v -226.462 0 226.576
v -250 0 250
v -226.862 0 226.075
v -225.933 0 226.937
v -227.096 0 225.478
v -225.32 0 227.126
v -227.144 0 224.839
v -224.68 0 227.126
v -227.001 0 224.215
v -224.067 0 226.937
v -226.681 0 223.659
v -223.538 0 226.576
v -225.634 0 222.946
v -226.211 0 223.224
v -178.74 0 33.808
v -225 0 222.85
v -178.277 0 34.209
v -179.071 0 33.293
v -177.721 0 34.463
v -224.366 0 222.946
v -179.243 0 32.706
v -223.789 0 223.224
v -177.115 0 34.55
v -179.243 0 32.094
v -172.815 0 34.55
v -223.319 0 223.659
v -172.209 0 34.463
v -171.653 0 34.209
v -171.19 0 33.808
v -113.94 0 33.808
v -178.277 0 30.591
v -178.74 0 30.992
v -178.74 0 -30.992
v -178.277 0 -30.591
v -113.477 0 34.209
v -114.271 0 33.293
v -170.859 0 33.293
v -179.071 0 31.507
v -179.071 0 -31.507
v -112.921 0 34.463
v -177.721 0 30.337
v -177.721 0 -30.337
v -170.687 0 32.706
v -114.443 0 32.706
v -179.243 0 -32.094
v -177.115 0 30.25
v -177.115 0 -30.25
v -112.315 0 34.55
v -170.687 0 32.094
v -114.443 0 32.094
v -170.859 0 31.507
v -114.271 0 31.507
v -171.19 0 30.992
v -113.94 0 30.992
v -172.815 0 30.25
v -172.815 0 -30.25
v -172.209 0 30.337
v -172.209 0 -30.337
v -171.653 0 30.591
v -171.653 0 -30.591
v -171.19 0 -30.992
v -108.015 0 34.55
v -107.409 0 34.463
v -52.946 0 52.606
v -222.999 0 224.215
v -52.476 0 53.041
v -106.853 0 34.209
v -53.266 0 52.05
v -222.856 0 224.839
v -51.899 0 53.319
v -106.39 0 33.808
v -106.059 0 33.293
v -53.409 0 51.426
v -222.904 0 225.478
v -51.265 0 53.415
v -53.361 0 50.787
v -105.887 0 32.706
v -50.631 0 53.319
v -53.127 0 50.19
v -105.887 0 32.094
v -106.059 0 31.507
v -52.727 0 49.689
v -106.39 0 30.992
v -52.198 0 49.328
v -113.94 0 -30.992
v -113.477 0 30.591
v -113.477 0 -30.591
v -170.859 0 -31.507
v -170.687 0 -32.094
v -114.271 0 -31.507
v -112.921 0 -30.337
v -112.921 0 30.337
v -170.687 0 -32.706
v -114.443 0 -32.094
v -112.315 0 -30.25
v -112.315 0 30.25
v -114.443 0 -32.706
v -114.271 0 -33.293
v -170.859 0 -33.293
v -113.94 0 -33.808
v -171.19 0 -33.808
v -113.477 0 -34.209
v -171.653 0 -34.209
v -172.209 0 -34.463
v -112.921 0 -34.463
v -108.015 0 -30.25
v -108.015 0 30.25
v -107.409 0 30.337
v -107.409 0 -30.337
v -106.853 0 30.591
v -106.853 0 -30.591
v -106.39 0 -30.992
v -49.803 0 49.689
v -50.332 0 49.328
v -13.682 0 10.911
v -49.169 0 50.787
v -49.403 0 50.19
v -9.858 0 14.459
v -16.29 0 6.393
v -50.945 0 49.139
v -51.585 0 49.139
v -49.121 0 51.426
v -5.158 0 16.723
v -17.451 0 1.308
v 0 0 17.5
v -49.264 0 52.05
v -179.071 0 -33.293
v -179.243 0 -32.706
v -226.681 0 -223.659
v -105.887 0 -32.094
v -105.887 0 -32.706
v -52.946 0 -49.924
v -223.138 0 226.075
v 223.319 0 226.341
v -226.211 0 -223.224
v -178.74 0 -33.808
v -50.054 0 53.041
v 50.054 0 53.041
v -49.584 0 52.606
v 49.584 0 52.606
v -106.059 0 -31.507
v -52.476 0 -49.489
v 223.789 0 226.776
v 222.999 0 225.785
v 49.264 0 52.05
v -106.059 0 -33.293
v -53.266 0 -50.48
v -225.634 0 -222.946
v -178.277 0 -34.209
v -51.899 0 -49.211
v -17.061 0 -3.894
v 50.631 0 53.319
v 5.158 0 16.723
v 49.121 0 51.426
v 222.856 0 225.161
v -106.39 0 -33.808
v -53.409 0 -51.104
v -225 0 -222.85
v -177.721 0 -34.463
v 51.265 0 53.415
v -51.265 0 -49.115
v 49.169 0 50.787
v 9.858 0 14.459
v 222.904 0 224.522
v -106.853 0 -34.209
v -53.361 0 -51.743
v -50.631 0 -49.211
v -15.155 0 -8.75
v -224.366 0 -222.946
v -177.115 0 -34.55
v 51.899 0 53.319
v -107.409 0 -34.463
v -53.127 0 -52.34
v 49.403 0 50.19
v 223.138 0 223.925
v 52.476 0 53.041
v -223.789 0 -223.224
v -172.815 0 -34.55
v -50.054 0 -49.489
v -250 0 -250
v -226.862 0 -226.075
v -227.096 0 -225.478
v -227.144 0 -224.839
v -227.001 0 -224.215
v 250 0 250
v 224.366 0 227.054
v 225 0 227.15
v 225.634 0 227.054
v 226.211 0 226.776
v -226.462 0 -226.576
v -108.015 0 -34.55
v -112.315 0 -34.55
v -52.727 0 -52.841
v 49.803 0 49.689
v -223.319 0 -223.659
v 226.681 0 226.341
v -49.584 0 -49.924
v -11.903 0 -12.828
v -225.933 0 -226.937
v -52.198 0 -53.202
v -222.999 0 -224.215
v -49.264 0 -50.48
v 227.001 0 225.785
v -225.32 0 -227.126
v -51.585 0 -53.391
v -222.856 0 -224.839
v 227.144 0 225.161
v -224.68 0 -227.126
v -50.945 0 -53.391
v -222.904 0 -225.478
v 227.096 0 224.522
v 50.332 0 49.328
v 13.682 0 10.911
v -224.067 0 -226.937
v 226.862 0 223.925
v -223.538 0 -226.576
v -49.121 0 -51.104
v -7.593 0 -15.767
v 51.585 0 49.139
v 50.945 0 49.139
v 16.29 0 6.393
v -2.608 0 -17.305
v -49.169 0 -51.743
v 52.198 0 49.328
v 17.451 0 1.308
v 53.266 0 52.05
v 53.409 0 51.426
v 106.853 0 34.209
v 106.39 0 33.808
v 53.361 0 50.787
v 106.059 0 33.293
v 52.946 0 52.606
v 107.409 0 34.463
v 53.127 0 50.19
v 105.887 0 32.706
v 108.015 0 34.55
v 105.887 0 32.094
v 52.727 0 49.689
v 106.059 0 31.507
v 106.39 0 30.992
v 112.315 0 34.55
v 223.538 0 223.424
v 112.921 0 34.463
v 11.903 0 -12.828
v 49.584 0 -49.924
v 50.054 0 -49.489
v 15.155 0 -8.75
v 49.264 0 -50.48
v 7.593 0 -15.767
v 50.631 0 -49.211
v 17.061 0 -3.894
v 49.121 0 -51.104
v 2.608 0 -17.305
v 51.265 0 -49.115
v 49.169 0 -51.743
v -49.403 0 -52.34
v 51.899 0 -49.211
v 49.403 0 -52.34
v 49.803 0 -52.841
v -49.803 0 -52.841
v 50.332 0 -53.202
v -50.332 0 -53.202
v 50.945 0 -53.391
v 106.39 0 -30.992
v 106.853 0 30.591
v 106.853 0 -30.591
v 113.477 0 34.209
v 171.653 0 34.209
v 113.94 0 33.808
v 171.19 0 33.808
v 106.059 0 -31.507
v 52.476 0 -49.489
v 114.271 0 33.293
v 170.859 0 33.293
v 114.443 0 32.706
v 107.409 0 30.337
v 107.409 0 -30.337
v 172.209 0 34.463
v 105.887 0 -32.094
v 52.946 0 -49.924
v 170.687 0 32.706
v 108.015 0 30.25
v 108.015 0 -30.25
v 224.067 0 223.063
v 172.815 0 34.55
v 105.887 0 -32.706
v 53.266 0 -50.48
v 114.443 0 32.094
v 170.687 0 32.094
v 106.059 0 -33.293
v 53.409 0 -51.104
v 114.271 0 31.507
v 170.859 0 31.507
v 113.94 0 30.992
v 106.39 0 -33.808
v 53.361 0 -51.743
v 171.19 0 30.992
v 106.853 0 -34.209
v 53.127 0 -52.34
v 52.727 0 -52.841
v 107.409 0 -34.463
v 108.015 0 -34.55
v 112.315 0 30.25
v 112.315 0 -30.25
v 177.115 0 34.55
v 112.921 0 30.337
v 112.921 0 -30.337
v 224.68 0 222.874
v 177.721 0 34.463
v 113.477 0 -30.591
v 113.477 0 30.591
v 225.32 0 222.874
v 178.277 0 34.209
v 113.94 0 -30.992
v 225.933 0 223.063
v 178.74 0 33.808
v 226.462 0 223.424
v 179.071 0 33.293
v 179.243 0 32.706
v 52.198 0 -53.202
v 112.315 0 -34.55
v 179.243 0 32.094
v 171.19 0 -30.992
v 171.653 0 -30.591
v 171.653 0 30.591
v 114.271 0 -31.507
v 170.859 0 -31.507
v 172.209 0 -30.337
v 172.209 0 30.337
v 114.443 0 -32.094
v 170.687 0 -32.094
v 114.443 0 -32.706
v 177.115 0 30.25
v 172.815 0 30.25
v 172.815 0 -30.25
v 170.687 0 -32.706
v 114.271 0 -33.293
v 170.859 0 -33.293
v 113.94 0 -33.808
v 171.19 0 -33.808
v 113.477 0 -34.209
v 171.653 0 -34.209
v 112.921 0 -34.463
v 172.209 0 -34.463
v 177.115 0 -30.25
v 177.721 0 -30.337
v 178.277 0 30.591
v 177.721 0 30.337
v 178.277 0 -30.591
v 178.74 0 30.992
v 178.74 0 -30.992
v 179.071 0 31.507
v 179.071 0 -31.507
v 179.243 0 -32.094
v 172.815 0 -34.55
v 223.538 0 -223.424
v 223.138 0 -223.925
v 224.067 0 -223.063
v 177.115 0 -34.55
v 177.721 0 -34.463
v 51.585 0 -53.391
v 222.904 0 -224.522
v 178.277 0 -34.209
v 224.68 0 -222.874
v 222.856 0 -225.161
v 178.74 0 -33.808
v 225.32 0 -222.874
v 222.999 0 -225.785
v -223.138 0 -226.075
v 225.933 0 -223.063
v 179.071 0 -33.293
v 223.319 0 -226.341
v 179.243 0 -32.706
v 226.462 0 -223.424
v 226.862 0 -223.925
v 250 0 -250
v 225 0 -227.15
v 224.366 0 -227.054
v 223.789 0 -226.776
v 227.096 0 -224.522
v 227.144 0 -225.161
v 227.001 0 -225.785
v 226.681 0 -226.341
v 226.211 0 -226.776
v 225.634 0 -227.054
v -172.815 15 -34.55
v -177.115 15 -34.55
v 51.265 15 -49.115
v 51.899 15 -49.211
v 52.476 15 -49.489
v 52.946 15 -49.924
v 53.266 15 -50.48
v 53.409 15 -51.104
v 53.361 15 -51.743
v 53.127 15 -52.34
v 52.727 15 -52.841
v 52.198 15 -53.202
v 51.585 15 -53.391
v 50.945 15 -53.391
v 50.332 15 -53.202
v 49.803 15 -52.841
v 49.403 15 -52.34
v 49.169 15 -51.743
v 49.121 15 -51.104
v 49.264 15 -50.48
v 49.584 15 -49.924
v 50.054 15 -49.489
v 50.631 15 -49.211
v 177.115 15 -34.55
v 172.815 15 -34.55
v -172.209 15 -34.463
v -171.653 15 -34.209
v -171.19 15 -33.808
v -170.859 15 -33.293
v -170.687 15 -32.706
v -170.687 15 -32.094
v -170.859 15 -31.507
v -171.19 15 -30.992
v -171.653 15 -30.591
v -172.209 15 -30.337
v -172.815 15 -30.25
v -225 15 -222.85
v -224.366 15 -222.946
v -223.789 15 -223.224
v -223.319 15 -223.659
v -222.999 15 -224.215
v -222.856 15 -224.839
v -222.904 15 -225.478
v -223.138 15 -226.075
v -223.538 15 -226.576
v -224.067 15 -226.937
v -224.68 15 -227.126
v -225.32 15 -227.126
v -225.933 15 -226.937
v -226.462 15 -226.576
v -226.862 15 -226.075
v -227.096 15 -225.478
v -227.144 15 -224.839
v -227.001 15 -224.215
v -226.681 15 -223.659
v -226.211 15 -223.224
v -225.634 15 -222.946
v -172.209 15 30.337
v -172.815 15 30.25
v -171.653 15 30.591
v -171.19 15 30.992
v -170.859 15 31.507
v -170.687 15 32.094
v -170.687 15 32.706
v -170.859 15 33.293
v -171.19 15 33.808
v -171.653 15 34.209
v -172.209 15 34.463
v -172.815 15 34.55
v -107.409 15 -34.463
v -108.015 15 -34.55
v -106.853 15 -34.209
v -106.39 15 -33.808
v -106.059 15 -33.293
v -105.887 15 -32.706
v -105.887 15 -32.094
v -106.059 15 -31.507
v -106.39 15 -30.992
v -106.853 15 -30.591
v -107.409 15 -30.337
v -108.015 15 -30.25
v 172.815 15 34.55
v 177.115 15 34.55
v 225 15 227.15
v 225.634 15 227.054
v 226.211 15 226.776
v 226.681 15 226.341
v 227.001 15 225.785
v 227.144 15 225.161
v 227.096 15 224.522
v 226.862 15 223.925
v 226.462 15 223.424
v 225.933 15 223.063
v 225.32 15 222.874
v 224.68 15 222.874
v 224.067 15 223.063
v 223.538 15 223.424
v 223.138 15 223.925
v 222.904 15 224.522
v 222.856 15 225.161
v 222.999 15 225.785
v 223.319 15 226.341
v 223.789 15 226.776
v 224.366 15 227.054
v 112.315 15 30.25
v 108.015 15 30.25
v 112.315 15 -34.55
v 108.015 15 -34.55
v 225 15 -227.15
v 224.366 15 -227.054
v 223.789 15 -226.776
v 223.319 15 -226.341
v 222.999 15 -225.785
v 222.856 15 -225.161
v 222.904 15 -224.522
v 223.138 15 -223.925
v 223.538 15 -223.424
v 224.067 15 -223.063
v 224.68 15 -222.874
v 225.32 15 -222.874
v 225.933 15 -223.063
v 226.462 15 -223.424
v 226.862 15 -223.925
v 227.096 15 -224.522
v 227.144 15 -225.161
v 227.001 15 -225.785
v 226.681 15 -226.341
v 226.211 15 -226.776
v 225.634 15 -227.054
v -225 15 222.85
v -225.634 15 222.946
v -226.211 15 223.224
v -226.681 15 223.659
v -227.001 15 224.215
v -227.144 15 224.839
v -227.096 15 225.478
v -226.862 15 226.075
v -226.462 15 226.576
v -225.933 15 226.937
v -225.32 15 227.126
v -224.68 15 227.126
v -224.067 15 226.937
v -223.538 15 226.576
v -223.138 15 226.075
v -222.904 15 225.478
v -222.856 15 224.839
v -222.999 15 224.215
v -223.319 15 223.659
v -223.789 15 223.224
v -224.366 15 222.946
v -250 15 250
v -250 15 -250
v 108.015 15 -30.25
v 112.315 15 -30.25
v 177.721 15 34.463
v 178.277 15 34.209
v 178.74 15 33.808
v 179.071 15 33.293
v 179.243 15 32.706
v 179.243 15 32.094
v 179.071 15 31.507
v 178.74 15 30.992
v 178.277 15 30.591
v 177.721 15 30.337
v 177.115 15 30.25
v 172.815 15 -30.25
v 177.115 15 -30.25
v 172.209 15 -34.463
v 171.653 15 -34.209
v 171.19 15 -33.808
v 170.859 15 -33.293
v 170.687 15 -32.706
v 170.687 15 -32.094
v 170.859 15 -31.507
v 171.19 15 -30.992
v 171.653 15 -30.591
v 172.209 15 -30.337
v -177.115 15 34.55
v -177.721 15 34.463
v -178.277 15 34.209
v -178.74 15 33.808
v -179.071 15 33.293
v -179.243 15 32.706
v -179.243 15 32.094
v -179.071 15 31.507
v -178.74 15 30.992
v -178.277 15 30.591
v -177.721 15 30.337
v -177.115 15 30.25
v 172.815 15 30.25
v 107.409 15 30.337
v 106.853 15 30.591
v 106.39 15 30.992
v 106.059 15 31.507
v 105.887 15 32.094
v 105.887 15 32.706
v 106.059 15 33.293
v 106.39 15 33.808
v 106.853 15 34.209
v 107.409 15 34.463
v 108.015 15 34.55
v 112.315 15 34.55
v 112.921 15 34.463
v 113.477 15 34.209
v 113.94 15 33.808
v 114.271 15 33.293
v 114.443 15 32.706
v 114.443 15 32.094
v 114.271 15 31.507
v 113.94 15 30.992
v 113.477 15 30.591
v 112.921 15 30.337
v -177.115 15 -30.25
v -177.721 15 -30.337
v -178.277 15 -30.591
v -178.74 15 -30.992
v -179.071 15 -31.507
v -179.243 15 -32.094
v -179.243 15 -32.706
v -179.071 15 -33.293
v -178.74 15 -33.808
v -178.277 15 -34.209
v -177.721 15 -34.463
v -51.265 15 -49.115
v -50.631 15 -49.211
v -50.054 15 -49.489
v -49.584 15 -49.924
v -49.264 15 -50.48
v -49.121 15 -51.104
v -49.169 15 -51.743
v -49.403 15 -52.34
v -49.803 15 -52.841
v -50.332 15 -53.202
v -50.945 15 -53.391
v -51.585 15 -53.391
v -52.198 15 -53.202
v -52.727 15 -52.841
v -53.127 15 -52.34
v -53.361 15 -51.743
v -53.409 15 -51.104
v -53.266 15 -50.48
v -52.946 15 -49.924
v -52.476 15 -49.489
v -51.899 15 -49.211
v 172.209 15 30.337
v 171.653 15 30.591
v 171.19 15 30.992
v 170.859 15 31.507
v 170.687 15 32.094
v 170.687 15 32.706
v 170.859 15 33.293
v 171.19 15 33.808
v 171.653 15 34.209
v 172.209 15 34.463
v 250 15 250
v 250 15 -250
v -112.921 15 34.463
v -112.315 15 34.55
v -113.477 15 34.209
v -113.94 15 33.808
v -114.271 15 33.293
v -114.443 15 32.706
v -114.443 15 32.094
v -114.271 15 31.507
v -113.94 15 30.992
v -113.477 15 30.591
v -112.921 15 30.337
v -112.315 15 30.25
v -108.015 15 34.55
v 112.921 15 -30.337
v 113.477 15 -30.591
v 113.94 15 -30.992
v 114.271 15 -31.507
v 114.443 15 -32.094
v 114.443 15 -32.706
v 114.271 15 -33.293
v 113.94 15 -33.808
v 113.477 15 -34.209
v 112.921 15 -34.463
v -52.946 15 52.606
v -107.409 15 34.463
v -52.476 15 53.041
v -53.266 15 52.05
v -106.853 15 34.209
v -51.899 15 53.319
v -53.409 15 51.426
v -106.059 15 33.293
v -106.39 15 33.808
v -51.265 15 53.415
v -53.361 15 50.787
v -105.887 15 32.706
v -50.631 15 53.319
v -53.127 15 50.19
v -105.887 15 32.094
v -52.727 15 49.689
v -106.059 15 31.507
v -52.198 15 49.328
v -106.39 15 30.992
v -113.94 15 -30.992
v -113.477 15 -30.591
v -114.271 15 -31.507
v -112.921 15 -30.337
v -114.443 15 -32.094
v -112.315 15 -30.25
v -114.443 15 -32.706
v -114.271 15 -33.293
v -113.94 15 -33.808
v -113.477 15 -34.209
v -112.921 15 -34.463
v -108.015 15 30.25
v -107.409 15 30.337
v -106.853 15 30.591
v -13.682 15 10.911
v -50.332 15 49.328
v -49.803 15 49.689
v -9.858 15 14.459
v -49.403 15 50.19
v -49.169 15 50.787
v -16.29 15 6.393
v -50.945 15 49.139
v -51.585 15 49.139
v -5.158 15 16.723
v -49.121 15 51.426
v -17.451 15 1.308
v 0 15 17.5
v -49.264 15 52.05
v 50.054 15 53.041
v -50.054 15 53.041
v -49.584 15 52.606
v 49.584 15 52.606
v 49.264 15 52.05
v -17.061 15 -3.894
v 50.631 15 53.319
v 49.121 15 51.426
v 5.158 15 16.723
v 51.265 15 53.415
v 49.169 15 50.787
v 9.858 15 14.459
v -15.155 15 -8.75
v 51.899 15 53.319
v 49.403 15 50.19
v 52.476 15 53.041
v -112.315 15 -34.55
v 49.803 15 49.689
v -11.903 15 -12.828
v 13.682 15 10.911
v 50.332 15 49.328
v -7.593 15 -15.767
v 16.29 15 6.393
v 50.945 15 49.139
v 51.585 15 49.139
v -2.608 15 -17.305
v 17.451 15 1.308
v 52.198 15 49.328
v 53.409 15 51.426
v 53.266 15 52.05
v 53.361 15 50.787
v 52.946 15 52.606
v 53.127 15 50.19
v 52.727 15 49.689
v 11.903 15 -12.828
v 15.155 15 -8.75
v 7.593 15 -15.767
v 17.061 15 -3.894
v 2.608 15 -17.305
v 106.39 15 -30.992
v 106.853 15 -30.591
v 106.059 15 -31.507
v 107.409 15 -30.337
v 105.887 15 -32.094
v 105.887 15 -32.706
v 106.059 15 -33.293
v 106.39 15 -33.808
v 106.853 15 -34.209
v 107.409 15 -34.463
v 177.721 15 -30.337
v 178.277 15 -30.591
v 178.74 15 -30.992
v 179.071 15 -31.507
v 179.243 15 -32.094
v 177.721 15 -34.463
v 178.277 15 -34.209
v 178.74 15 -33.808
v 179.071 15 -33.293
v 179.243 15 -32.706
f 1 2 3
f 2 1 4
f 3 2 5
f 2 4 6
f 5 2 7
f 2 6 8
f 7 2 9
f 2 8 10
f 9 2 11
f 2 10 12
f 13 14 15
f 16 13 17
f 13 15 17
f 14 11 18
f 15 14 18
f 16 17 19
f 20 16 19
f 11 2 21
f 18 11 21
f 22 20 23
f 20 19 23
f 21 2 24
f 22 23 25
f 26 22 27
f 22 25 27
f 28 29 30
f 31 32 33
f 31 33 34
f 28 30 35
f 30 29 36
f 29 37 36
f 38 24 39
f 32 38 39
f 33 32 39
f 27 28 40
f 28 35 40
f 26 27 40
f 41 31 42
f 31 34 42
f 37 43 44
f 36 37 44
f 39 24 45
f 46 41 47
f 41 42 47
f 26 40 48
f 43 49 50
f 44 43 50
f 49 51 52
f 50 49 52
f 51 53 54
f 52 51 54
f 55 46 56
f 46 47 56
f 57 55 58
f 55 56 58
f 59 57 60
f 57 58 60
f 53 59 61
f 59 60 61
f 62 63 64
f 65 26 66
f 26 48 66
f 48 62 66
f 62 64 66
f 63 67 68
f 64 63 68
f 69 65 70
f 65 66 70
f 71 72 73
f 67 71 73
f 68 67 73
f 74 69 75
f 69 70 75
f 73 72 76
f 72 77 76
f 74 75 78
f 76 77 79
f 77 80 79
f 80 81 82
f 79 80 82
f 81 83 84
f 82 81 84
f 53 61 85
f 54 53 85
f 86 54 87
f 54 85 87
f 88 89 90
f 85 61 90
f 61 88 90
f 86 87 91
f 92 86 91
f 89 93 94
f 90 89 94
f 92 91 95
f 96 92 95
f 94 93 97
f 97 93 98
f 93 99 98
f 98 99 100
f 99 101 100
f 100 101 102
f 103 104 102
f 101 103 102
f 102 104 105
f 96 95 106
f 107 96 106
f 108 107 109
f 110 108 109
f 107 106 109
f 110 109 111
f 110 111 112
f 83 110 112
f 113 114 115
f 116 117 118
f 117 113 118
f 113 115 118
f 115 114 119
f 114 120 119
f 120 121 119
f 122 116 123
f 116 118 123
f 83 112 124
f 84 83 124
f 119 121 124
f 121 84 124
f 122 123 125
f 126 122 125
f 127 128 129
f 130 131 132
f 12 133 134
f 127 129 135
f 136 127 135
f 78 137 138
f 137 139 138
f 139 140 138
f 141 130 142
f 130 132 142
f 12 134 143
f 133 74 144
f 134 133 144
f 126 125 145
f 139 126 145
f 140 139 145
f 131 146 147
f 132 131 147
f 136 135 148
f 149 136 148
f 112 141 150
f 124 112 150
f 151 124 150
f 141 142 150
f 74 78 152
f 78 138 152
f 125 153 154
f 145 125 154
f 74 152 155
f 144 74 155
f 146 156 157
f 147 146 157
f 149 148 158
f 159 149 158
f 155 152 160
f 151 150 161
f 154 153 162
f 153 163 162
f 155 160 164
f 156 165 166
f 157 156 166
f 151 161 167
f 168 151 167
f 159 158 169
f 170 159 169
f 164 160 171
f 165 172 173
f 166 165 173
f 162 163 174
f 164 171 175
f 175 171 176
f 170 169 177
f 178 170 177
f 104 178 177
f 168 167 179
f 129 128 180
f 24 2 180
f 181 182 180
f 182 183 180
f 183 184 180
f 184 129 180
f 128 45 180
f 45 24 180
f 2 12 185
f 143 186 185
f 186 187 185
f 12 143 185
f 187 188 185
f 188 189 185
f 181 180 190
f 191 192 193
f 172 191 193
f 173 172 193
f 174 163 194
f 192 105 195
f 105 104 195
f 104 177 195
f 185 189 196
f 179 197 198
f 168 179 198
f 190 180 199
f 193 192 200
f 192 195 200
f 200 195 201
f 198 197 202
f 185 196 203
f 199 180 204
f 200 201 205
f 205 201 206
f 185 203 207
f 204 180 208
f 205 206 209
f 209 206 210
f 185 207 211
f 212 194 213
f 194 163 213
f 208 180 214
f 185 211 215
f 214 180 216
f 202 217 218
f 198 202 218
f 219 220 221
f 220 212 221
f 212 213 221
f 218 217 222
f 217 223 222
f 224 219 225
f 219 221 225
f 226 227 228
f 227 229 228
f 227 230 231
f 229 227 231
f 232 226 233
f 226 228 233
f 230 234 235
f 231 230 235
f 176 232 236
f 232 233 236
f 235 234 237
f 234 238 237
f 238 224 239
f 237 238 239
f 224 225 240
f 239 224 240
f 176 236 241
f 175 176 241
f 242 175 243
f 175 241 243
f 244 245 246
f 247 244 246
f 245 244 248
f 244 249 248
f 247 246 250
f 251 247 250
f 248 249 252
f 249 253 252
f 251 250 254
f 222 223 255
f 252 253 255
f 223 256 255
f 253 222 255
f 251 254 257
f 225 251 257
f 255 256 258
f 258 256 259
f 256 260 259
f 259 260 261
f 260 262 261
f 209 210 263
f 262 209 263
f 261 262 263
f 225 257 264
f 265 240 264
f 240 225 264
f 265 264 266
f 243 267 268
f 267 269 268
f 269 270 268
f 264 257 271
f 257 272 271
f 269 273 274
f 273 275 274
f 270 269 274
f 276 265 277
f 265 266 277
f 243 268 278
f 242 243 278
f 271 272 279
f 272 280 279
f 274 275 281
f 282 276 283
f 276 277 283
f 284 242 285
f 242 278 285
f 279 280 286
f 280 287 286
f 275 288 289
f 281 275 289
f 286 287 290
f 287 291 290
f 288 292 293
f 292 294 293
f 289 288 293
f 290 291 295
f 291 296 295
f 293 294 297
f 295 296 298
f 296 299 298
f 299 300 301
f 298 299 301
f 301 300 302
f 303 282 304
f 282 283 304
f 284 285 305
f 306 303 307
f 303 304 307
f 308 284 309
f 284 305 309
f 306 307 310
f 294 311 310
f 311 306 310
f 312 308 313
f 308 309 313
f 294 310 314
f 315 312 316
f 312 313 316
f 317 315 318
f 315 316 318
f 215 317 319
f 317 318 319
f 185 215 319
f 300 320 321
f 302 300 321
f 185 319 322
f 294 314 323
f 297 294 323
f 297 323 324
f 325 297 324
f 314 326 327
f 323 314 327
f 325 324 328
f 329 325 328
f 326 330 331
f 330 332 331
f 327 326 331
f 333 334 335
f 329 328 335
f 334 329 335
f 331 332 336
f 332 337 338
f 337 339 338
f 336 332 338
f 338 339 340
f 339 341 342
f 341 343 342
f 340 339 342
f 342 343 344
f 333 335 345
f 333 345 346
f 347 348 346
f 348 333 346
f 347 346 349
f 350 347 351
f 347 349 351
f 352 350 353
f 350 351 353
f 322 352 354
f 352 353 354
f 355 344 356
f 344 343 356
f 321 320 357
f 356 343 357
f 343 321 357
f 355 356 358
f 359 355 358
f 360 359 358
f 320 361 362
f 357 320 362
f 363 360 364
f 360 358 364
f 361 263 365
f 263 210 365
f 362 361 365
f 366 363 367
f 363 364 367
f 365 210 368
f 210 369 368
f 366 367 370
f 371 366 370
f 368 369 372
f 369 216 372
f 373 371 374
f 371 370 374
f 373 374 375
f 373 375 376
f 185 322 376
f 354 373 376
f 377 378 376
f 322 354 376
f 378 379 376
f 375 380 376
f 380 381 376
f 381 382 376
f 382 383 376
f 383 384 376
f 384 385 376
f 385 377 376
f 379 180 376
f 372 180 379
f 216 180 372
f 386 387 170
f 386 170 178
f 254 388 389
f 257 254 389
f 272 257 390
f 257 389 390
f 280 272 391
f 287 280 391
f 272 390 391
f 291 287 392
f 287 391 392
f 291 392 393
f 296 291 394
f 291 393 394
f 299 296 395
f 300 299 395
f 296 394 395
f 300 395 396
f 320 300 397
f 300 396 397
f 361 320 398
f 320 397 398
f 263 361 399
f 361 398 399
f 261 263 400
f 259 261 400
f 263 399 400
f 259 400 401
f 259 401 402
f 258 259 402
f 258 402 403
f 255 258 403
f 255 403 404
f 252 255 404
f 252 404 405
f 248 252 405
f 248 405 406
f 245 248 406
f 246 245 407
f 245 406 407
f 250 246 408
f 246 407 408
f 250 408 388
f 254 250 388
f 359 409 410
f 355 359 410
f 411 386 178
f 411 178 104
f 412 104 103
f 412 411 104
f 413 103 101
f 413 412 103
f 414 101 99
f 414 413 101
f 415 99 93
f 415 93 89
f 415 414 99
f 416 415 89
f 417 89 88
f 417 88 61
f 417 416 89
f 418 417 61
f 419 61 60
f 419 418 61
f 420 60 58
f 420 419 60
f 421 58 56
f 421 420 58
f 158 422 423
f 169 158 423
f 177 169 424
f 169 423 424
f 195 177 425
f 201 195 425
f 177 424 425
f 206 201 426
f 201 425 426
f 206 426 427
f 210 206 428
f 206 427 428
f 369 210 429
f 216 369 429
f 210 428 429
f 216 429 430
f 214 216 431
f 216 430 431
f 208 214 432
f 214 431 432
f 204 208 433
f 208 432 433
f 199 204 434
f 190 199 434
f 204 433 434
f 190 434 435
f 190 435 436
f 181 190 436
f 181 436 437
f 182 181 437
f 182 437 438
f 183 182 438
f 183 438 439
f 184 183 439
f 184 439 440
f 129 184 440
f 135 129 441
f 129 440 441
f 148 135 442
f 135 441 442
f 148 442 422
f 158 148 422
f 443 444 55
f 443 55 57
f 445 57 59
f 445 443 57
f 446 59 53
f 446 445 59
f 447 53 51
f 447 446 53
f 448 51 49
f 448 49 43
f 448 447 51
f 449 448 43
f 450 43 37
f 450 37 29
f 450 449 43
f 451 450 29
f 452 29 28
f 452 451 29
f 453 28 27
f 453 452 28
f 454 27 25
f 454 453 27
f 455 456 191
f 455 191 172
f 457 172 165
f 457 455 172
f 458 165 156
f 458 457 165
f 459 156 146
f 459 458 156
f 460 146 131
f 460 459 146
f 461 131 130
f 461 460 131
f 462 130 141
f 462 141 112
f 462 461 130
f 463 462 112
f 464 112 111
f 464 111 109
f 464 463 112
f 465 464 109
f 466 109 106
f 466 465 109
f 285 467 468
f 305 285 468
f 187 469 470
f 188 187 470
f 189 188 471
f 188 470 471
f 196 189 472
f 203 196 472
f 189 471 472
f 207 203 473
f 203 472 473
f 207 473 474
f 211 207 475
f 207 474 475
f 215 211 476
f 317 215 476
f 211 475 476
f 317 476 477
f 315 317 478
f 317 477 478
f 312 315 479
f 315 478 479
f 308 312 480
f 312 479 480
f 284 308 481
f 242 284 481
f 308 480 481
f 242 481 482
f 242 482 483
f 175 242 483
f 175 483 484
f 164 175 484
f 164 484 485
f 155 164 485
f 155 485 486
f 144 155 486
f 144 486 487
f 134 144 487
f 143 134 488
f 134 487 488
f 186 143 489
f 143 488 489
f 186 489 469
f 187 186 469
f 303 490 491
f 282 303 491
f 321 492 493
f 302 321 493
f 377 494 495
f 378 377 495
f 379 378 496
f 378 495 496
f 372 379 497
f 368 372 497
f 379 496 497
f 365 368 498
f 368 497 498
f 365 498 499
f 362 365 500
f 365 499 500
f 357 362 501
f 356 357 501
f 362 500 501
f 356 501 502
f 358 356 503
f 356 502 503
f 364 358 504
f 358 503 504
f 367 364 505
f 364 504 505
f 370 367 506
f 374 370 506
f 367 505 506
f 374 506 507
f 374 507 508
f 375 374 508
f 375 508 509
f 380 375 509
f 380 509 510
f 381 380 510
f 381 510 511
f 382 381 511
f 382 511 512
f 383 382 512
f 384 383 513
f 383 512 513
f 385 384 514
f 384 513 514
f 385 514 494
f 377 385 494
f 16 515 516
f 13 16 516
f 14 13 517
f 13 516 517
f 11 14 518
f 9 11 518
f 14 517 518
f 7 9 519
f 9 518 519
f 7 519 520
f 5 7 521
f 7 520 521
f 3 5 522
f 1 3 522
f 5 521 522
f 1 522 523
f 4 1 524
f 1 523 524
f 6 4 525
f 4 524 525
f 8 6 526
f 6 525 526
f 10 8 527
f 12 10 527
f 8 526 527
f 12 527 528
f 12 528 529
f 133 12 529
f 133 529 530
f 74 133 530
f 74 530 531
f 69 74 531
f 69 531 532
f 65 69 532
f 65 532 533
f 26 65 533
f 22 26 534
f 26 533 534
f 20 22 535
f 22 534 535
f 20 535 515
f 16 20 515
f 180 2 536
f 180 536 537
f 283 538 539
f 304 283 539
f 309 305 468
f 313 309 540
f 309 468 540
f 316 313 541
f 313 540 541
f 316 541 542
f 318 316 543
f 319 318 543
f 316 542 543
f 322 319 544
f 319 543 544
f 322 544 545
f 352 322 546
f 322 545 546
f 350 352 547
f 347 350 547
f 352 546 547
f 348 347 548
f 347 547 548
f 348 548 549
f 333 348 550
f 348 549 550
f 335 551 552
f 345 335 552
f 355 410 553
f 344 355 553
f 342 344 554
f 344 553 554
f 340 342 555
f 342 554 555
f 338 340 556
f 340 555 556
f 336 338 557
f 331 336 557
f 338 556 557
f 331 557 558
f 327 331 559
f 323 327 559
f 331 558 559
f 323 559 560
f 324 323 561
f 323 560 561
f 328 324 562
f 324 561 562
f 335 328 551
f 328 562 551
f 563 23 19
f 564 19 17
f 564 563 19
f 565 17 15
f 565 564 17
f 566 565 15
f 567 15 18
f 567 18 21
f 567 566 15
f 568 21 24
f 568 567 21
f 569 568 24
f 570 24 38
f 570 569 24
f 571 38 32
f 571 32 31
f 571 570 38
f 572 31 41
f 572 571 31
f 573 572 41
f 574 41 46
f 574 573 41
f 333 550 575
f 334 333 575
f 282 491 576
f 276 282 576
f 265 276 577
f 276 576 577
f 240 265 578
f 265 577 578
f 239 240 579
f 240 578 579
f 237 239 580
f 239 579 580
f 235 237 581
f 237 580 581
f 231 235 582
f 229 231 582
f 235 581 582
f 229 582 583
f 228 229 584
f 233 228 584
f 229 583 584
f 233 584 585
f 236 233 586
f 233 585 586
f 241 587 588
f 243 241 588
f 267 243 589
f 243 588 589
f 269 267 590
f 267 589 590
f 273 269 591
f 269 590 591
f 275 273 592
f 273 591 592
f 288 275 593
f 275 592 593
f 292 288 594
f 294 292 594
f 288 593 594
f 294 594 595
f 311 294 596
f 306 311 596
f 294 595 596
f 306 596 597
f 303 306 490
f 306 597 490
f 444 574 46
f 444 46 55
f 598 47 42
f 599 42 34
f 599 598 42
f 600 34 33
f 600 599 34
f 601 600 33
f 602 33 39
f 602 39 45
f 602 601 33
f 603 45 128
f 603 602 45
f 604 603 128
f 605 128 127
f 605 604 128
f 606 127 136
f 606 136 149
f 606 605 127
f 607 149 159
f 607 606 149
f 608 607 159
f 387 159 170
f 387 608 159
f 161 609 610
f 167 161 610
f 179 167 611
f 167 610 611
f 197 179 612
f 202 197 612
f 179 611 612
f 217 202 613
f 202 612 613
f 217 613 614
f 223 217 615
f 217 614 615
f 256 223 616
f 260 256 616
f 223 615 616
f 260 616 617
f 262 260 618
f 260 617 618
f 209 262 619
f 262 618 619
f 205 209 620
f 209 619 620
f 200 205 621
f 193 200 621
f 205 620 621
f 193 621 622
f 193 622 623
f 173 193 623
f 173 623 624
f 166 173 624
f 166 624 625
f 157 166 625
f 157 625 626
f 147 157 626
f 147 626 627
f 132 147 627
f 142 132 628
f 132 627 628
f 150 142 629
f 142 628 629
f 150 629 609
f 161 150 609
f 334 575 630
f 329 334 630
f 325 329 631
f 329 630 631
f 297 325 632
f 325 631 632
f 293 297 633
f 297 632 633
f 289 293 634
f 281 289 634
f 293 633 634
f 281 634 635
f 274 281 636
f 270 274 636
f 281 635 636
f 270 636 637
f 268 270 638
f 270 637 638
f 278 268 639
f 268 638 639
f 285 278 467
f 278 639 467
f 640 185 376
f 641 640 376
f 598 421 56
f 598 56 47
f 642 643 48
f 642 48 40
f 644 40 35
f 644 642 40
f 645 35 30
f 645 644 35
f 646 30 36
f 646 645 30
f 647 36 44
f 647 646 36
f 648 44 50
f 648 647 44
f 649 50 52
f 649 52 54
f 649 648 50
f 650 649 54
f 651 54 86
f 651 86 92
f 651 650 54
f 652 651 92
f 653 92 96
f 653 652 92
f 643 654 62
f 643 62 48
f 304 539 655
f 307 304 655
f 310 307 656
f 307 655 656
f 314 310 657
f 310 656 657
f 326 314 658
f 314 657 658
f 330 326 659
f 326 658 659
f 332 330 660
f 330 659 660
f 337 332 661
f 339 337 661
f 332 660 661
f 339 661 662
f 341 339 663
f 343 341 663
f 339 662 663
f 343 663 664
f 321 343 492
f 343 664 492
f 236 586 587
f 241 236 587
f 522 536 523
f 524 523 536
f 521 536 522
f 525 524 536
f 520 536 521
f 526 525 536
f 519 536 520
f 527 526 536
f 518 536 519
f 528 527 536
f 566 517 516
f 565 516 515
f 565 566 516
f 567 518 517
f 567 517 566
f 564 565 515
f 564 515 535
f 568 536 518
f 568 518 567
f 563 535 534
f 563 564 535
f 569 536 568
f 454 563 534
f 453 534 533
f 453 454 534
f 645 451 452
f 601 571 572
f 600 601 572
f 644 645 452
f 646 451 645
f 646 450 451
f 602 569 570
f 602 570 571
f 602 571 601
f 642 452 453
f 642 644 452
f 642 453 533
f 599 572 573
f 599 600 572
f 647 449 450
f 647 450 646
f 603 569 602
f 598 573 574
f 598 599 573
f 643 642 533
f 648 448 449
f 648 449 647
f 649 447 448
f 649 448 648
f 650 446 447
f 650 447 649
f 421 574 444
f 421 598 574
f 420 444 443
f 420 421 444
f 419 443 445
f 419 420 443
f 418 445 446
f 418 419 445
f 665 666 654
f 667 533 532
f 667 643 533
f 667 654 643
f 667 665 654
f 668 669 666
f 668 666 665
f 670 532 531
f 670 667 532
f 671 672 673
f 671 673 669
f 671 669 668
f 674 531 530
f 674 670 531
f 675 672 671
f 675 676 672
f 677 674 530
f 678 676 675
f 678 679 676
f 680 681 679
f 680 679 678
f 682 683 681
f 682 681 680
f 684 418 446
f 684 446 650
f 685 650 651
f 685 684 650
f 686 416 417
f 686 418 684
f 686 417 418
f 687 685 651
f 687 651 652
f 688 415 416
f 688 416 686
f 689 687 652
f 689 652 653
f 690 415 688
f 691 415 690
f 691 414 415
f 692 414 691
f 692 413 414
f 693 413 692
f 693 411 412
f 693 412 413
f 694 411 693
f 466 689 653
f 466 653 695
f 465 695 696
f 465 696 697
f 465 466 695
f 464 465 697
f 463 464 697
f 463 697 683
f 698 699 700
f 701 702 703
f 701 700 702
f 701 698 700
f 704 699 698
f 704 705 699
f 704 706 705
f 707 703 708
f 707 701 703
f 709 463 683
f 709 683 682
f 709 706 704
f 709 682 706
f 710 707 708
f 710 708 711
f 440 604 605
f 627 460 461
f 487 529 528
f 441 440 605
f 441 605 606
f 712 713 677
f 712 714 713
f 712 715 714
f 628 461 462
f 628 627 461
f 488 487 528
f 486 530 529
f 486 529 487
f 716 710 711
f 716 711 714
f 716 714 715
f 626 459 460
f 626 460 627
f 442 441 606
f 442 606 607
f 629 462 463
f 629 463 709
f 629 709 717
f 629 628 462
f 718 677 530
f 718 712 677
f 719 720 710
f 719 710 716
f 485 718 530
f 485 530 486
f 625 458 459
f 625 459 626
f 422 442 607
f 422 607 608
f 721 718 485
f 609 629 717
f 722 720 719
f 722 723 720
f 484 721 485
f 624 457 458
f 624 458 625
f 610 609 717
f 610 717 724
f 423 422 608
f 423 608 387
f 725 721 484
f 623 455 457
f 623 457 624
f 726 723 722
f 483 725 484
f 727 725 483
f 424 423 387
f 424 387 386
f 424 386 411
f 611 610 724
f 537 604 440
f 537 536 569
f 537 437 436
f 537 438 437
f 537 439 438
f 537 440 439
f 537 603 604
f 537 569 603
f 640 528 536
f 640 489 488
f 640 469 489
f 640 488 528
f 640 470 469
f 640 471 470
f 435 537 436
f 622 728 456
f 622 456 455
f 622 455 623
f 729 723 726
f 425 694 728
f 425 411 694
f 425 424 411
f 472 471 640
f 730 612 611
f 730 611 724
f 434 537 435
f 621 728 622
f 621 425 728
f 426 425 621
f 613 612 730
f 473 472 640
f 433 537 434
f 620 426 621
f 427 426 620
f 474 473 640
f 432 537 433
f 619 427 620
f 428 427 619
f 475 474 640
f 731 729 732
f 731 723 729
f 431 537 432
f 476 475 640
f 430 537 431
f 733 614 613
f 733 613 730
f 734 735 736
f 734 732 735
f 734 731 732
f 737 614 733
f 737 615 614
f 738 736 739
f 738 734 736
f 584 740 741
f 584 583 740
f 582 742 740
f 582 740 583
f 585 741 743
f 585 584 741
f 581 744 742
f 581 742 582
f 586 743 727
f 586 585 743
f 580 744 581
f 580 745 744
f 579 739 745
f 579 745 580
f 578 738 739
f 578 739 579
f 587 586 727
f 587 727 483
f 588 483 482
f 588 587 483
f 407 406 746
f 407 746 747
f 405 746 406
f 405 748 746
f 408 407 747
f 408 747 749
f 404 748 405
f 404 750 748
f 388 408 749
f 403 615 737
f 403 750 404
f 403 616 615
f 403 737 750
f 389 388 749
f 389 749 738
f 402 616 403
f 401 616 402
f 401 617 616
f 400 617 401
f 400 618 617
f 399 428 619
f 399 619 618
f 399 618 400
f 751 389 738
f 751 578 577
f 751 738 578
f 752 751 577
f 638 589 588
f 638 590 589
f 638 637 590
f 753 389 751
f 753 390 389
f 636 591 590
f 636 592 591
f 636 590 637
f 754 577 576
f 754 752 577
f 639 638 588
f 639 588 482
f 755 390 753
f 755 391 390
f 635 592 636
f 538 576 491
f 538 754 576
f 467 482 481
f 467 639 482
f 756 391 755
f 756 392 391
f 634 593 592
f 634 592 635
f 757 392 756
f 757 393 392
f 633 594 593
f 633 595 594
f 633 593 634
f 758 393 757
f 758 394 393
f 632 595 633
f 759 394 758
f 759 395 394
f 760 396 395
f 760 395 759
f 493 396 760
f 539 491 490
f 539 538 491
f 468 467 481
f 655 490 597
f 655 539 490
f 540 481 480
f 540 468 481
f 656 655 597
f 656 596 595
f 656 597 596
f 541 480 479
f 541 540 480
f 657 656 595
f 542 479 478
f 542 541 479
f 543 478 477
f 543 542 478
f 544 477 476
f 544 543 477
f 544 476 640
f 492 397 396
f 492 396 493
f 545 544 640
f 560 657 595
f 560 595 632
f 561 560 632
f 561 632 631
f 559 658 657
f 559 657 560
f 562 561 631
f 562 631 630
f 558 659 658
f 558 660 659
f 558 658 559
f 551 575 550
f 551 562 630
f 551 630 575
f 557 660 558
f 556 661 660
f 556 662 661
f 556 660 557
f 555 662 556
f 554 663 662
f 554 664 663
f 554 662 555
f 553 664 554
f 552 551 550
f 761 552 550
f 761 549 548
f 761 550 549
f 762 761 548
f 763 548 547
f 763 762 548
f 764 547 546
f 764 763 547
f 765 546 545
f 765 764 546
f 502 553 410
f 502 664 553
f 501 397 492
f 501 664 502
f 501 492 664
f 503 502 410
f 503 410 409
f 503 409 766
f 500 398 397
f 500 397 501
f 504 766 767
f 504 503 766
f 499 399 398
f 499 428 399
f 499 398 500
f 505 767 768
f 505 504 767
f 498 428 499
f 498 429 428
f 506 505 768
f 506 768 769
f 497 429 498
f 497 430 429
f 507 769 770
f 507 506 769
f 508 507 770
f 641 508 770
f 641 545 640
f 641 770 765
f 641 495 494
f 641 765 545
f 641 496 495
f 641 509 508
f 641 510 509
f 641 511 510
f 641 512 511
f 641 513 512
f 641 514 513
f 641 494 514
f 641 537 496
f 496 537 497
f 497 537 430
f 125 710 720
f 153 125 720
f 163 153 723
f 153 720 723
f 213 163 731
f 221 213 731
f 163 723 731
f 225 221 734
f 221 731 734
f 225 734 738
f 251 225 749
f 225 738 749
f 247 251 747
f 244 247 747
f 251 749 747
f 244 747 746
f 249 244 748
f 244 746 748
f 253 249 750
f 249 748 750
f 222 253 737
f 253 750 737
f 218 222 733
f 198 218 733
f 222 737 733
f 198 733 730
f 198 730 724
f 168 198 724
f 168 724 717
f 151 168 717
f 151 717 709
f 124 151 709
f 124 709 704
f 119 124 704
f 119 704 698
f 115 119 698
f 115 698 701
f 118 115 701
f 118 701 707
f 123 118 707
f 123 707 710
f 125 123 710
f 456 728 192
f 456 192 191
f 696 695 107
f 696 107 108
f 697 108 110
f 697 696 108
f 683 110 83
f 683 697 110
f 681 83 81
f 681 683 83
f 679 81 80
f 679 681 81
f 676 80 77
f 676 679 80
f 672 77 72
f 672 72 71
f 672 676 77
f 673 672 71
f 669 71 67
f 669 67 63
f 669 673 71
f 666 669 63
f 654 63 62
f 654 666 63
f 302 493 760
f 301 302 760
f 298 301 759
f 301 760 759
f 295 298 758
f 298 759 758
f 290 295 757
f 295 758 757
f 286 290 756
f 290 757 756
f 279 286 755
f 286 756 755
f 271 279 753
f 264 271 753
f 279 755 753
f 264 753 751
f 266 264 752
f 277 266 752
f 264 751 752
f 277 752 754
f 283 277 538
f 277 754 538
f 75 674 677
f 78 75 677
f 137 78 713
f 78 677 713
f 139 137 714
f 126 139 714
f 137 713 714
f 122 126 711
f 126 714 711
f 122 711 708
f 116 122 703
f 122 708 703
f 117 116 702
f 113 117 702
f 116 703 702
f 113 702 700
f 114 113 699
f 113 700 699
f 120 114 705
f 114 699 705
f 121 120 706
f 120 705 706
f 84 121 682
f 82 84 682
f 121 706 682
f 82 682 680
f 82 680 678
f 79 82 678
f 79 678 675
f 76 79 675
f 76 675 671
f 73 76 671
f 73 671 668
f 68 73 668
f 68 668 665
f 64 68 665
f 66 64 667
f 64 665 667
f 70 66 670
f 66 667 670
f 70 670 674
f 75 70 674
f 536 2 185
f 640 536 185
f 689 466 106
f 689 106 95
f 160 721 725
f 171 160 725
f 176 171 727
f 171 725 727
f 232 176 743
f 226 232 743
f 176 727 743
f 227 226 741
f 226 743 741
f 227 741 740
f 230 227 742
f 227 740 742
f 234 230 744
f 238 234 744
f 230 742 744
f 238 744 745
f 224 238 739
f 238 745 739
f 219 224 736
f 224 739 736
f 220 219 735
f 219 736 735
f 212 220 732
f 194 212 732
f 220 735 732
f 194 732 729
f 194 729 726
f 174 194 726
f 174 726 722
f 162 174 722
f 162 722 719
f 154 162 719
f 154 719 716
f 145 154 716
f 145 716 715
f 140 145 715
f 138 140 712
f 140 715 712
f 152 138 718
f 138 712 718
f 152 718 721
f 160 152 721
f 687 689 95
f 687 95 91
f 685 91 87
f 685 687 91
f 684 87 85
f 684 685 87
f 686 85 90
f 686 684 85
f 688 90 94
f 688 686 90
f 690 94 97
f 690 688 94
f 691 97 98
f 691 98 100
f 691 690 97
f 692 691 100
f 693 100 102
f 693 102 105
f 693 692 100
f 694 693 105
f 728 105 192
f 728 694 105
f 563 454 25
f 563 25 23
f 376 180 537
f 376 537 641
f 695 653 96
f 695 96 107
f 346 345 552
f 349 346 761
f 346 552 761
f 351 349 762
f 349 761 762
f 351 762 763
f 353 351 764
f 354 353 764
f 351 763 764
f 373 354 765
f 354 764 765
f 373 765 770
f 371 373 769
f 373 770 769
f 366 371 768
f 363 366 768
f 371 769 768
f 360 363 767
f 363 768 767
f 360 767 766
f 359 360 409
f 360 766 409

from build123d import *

# Parameters (mm, degrees)
CROQUIS1_W              = 500
CROQUIS1_H              = 500
SALIENTE_EXTRUIR1_DEPTH = 15
CROQUIS2_R              = 2.15
CORTAR_EXTRUIR1_DEPTH   = 15
CROQUIS3_R              = 2.15
CORTAR_EXTRUIR3_DEPTH   = 15
CROQUIS4_R              = 17.5
CORTAR_EXTRUIR4_DEPTH   = 40


with BuildPart() as part:
    # Croquis1 → Saliente-Extruir1 (new body)
    with BuildSketch(Plane(origin=(0, 0, 0), x_dir=(1, 0, 0), z_dir=(0, 1, 0))):
        Rectangle(CROQUIS1_W, CROQUIS1_H)
    extrude(amount=SALIENTE_EXTRUIR1_DEPTH)

    # Croquis2 → Cortar-Extruir1 (cut)
    with BuildSketch(Plane(origin=(0, 15, 0), x_dir=(1, 0, 0), z_dir=(0, 1, 0))):
        with Locations(Location((-225, 225, 0), (0, 0, 270))):
            Circle(CROQUIS2_R)
        with Locations(Location((225, 225, 0), (0, 0, 90))):
            Circle(CROQUIS2_R)
        with Locations(Location((225, -225, 0), (0, 0, 270))):
            Circle(CROQUIS2_R)
        with Locations(Location((-225, -225, 0), (0, 0, 90))):
            Circle(CROQUIS2_R)
    extrude(amount=-CORTAR_EXTRUIR1_DEPTH, mode=Mode.SUBTRACT)

    # Croquis3 → Cortar-Extruir3 (cut)
    with BuildSketch(Plane(origin=(0, 15, 0), x_dir=(1, 0, 0), z_dir=(0, 1, 0))):
        with Locations(Location((-51.265, 51.265, 0), (0, 0, 270))):
            Circle(CROQUIS3_R)
        with Locations(Location((-51.265, -51.265, 0), (0, 0, 270))):
            Circle(CROQUIS3_R)
        with Locations(Location((51.265, -51.265, 0), (0, 0, 270))):
            Circle(CROQUIS3_R)
        with Locations(Location((51.265, 51.265, 0), (0, 0, 270))):
            Circle(CROQUIS3_R)
        with BuildLine():
            Line((-177.115, 34.55), (-172.815, 34.55))
            ThreePointArc((-172.815, 34.55), (-170.665, 32.4), (-172.815, 30.25))
            Line((-172.815, 30.25), (-177.115, 30.25))
            ThreePointArc((-177.115, 30.25), (-179.265, 32.4), (-177.115, 34.55))
        make_face()
        with BuildLine():
            Line((-177.115, -30.25), (-172.815, -30.25))
            ThreePointArc((-172.815, -30.25), (-170.665, -32.4), (-172.815, -34.55))
            Line((-172.815, -34.55), (-177.115, -34.55))
            ThreePointArc((-177.115, -34.55), (-179.265, -32.4), (-177.115, -30.25))
        make_face()
        with BuildLine():
            Line((-112.315, -30.25), (-108.015, -30.25))
            ThreePointArc((-108.015, -30.25), (-105.865, -32.4), (-108.015, -34.55))
            Line((-108.015, -34.55), (-112.315, -34.55))
            ThreePointArc((-112.315, -34.55), (-114.465, -32.4), (-112.315, -30.25))
        make_face()
        with BuildLine():
            Line((-112.315, 34.55), (-108.015, 34.55))
            ThreePointArc((-108.015, 34.55), (-105.865, 32.4), (-108.015, 30.25))
            Line((-108.015, 30.25), (-112.315, 30.25))
            ThreePointArc((-112.315, 30.25), (-114.465, 32.4), (-112.315, 34.55))
        make_face()
        with BuildLine():
            Line((177.115, -30.25), (172.815, -30.25))
            ThreePointArc((172.815, -30.25), (170.665, -32.4), (172.815, -34.55))
            Line((172.815, -34.55), (177.115, -34.55))
            ThreePointArc((177.115, -34.55), (179.265, -32.4), (177.115, -30.25))
        make_face()
        with BuildLine():
            Line((177.115, 34.55), (172.815, 34.55))
            ThreePointArc((172.815, 34.55), (170.665, 32.4), (172.815, 30.25))
            Line((172.815, 30.25), (177.115, 30.25))
            ThreePointArc((177.115, 30.25), (179.265, 32.4), (177.115, 34.55))
        make_face()
        with BuildLine():
            Line((112.315, -30.25), (108.015, -30.25))
            ThreePointArc((108.015, -30.25), (105.865, -32.4), (108.015, -34.55))
            Line((108.015, -34.55), (112.315, -34.55))
            ThreePointArc((112.315, -34.55), (114.465, -32.4), (112.315, -30.25))
        make_face()
        with BuildLine():
            Line((112.315, 34.55), (108.015, 34.55))
            ThreePointArc((108.015, 34.55), (105.865, 32.4), (108.015, 30.25))
            Line((108.015, 30.25), (112.315, 30.25))
            ThreePointArc((112.315, 30.25), (114.465, 32.4), (112.315, 34.55))
        make_face()
    extrude(amount=-CORTAR_EXTRUIR3_DEPTH, mode=Mode.SUBTRACT)

    # Croquis4 → Cortar-Extruir4 (cut)
    with BuildSketch(Plane(origin=(0, 15, 0), x_dir=(1, 0, 0), z_dir=(0, 1, 0))):
        with Locations(Location((0, 0, 0), (0, 0, 270))):
            Circle(CROQUIS4_R)
    extrude(amount=-CORTAR_EXTRUIR4_DEPTH, mode=Mode.SUBTRACT)


solid = part.part
